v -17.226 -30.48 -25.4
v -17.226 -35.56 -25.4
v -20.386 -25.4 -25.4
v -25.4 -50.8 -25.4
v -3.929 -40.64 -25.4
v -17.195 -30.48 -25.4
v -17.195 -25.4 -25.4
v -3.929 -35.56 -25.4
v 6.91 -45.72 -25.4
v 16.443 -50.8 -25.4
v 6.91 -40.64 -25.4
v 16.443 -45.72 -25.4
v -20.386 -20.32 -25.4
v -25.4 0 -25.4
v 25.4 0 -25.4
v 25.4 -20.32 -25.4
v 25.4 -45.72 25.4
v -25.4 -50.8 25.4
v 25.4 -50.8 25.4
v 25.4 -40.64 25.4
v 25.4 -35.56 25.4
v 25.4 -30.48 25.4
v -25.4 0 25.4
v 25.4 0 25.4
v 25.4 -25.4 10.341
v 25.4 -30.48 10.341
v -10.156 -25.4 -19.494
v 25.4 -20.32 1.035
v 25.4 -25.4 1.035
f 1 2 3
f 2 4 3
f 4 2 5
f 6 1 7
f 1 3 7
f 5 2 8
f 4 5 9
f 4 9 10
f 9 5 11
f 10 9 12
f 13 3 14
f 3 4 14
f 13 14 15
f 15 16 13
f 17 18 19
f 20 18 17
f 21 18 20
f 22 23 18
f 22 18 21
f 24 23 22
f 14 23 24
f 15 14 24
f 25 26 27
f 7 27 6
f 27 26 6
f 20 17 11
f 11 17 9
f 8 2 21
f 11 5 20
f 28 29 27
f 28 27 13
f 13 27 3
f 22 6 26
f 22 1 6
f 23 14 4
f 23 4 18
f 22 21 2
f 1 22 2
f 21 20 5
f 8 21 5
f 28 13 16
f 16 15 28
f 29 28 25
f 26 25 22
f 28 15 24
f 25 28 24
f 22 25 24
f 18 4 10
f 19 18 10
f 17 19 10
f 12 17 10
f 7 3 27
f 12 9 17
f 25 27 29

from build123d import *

# Parameters (mm, degrees)
F0_W      = 50.8
F0_H      = 50.8
F1_DEPTH  = 50.8
F3_DEPTH  = 5.08
F5_DEPTH  = 5.08
F7_DEPTH  = 5.08
F9_DEPTH  = 5.08
F11_DEPTH = 5.08
F13_DEPTH = 5.08


with BuildPart() as f1:
    # F0 (on Front) → F1 (new body)
    with BuildSketch(Plane.XZ):
        Rectangle(F0_W, F0_H)
    extrude(amount=F1_DEPTH)

    # F2 (on face) → F3 (cut)
    with BuildSketch(Plane.XZ.offset(50.8)):
        Polygon((31.007338, 25.4), (25.4, 25.4), (16.442589, -25.4), (31.007338, -25.4), align=None)
    extrude(amount=-F3_DEPTH, mode=Mode.SUBTRACT)

    # F4 (on face) → F5 (cut)
    with BuildSketch(Plane.XZ.offset(45.72)):
        Polygon((32.858667, 25.4), (25.4, 25.4), (6.626374, -26.180113), (32.858667, -26.180113), align=None)
    extrude(amount=-F5_DEPTH, mode=Mode.SUBTRACT)

    # F6 (on face) → F7 (cut)
    with BuildSketch(Plane.XZ.offset(40.64)):
        Polygon((35.186552, 25.4), (25.4, 25.4), (-7.151678, -30.981159), (35.186552, -30.981159), align=None)
    extrude(amount=-F7_DEPTH, mode=Mode.SUBTRACT)

    # F8 (on face) → F9 (cut)
    with BuildSketch(Plane.XZ.offset(35.56)):
        Polygon((63.193578, 25.4), (25.4, 25.4), (-24.735296, -34.348919), (63.193578, -34.348919), align=None)
    extrude(amount=-F9_DEPTH, mode=Mode.SUBTRACT)

    # F10 (on face) → F11 (cut)
    with BuildSketch(Plane.XZ.offset(30.48)):
        Polygon((66.855003, 25.4), (43.346025, 25.4), (-33.323239, -38.933151), (66.855003, -38.933151), align=None)
    extrude(amount=-F11_DEPTH, mode=Mode.SUBTRACT)

    # F12 (on face) → F13 (cut)
    with BuildSketch(Plane.XZ.offset(25.4)):
        Polygon((62.784301, 12.176968), (44.699044, 12.176968), (-34.901336, -33.780333), (62.784301, -33.780333), align=None)
    extrude(amount=-F13_DEPTH, mode=Mode.SUBTRACT)


solid = f1.part
